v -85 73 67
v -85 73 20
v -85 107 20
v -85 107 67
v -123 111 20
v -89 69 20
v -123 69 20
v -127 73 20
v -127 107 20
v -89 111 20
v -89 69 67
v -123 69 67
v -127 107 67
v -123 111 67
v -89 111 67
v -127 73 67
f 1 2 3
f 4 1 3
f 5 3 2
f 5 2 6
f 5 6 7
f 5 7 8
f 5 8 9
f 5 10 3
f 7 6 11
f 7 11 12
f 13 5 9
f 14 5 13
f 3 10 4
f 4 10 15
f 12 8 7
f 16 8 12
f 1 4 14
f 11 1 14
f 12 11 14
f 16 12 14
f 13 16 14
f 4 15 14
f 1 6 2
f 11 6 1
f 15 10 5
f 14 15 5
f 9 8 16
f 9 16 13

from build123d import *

# Parameters (mm, degrees)
BOX002_W     = 42
BOX002_H     = 42
BOX002_DEPTH = 47
CHAMFER_SIZE = 4


with BuildPart() as nema:
    # Box002 → Box002 (new body)
    with BuildSketch(Plane(origin=(85, 69, 20), x_dir=(1, 0, 0), z_dir=(0, 0, 1))):
        with Locations((21, 21)):
            Rectangle(BOX002_W, BOX002_H)
    extrude(amount=BOX002_DEPTH)

    # Chamfer
    chamfer_edges = [nema.edges().sort_by_distance(p)[0] for p in [
        (85, 69, 43.5),
        (85, 111, 43.5),
        (127, 69, 43.5),
        (127, 111, 43.5),
    ]]
    chamfer(chamfer_edges, length=CHAMFER_SIZE)


with BuildPart() as nema001:
    # Part__Mirroring003: instance of NEMA
    add(nema.part.mirror(Plane(origin=(0, 0, 0), x_dir=(0, -1, 0), z_dir=(1, 0, 0))))


solid = nema001.part
